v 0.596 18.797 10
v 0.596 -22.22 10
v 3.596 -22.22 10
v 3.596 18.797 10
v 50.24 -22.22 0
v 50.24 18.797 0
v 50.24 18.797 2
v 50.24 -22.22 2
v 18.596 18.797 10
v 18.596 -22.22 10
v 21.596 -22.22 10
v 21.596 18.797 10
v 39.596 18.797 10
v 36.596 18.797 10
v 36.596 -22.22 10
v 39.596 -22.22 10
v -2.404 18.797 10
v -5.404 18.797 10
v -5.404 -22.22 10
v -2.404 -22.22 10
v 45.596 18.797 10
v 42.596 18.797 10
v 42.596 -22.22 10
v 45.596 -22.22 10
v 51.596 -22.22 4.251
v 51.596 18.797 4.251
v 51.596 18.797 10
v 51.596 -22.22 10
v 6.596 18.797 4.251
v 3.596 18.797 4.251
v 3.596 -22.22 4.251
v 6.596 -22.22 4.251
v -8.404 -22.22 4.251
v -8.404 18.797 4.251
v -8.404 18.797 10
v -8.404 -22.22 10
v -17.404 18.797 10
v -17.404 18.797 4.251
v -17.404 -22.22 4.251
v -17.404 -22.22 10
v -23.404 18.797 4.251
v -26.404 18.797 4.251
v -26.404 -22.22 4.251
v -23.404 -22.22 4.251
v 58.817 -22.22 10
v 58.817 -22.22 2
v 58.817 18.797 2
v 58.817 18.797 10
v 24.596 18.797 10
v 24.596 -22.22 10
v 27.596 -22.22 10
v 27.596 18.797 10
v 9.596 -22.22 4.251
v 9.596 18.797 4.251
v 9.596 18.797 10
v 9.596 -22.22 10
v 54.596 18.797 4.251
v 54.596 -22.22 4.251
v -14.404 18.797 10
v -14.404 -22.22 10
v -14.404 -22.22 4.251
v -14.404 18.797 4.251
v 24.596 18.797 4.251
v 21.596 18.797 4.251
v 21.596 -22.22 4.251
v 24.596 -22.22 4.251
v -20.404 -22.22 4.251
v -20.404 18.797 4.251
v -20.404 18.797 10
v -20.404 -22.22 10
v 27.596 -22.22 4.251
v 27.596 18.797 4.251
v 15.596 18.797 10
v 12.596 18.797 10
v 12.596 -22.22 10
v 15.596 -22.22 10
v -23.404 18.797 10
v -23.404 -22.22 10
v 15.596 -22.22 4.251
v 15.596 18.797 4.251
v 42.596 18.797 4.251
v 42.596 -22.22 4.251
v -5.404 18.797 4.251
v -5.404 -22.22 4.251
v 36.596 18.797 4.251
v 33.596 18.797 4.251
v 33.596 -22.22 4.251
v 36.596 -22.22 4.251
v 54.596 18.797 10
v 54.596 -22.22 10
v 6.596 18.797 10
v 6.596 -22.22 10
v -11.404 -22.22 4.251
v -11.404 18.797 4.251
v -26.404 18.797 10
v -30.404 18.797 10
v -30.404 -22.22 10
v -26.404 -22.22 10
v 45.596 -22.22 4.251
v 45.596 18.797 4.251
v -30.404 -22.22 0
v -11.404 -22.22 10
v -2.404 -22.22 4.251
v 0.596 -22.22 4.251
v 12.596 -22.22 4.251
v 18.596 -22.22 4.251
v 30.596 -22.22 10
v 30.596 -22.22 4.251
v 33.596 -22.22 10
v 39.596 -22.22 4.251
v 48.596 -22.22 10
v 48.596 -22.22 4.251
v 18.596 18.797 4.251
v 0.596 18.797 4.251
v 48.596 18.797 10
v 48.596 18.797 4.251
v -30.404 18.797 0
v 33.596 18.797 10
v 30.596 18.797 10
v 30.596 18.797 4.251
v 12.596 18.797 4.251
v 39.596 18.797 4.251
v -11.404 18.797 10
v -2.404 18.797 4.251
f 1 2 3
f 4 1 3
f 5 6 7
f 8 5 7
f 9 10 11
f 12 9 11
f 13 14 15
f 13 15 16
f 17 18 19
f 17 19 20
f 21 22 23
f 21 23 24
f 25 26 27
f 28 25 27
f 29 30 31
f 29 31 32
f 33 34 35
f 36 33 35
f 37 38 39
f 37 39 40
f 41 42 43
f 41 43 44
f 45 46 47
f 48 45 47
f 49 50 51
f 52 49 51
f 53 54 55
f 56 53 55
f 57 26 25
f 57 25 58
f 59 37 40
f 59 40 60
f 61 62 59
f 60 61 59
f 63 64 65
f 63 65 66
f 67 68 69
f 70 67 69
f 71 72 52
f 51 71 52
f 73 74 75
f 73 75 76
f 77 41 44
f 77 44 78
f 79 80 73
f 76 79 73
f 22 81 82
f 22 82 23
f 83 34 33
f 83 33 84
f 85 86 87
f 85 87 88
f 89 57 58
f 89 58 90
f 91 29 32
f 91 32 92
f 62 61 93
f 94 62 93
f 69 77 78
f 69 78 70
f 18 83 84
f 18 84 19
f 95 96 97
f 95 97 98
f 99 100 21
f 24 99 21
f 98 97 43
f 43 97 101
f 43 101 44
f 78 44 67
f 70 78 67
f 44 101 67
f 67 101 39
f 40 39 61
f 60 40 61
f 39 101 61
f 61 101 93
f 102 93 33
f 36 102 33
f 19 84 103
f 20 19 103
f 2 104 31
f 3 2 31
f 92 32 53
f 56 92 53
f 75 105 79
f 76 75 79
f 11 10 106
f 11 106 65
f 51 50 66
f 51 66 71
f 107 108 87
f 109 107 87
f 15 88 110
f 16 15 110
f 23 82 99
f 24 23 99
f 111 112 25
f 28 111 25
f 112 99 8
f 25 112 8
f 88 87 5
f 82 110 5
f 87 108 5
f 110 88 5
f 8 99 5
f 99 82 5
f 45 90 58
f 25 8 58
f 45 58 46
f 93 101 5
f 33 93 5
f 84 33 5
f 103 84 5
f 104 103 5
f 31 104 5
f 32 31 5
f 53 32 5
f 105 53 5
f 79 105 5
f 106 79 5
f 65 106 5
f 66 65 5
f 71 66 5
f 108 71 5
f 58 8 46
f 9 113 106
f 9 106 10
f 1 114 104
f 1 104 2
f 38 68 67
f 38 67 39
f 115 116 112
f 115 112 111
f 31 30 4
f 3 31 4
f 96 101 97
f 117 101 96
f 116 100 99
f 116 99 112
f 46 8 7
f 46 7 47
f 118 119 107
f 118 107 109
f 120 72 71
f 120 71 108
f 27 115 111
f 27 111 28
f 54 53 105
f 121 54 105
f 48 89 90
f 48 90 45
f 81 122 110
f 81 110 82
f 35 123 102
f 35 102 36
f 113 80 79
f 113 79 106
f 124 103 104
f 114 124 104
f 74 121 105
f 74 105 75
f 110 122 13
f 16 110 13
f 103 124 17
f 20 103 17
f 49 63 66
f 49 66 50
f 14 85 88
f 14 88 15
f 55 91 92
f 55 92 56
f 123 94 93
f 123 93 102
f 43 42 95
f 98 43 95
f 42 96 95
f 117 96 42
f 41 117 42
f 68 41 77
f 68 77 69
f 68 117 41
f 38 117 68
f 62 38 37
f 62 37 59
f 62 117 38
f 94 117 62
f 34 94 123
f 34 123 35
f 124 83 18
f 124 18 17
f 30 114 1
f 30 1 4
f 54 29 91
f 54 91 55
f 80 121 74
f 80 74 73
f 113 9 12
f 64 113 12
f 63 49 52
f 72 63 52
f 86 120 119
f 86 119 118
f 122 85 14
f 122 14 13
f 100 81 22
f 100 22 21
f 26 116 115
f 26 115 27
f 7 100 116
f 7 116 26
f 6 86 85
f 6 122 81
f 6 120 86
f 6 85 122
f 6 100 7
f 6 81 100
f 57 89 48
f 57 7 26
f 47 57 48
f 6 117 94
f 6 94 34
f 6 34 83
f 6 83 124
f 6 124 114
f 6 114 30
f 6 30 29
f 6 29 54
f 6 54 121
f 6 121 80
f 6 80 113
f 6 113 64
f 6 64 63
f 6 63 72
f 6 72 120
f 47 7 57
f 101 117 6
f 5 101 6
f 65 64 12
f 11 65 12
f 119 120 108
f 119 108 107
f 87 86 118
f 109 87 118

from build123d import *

# Parameters (mm, degrees)
F0_W     = 89.221813
F0_H     = 41.016299
F1_DEPTH = 10
F2_W     = 8.577086
F2_H     = 2
F3_DEPTH = 41.017299
F4_W     = 3
F4_H     = 5.748613
F5_DEPTH = 41.017299


with BuildPart() as f1:
    # F0 (on Top) → F1 (new body)
    with BuildSketch(Plane.XY):
        with Locations((14.206558, -1.71161)):
            Rectangle(F0_W, F0_H)
    extrude(amount=F1_DEPTH)

    # F2 (on face) → F3 (cut, through all)
    with BuildSketch(Plane.XZ.offset(22.21976)):
        with Locations((54.528922, 1)):
            Rectangle(F2_W, F2_H)
    extrude(amount=-F3_DEPTH, mode=Mode.SUBTRACT)

    # F4 (on face) → F5 (cut, through all)
    with BuildSketch(Plane.XZ.offset(22.21976)):
        with Locations((-24.904348, 7.125694)):
            Rectangle(F4_W, F4_H)
        with Locations((-18.904348, 7.125694)):
            Rectangle(F4_W, F4_H)
        with Locations((-12.904348, 7.125694)):
            Rectangle(F4_W, F4_H)
        with Locations((-6.904348, 7.125694)):
            Rectangle(F4_W, F4_H)
        with Locations((-0.904348, 7.125694)):
            Rectangle(F4_W, F4_H)
        with Locations((5.095652, 7.125694)):
            Rectangle(F4_W, F4_H)
        with Locations((11.095652, 7.125694)):
            Rectangle(F4_W, F4_H)
        with Locations((17.095652, 7.125694)):
            Rectangle(F4_W, F4_H)
        with Locations((23.095652, 7.125694)):
            Rectangle(F4_W, F4_H)
        with Locations((29.095652, 7.125694)):
            Rectangle(F4_W, F4_H)
        with Locations((35.095652, 7.125694)):
            Rectangle(F4_W, F4_H)
        with Locations((41.095652, 7.125694)):
            Rectangle(F4_W, F4_H)
        with Locations((47.095652, 7.125694)):
            Rectangle(F4_W, F4_H)
        with Locations((53.095652, 7.125694)):
            Rectangle(F4_W, F4_H)
    extrude(amount=-F5_DEPTH, mode=Mode.SUBTRACT)


solid = f1.part
